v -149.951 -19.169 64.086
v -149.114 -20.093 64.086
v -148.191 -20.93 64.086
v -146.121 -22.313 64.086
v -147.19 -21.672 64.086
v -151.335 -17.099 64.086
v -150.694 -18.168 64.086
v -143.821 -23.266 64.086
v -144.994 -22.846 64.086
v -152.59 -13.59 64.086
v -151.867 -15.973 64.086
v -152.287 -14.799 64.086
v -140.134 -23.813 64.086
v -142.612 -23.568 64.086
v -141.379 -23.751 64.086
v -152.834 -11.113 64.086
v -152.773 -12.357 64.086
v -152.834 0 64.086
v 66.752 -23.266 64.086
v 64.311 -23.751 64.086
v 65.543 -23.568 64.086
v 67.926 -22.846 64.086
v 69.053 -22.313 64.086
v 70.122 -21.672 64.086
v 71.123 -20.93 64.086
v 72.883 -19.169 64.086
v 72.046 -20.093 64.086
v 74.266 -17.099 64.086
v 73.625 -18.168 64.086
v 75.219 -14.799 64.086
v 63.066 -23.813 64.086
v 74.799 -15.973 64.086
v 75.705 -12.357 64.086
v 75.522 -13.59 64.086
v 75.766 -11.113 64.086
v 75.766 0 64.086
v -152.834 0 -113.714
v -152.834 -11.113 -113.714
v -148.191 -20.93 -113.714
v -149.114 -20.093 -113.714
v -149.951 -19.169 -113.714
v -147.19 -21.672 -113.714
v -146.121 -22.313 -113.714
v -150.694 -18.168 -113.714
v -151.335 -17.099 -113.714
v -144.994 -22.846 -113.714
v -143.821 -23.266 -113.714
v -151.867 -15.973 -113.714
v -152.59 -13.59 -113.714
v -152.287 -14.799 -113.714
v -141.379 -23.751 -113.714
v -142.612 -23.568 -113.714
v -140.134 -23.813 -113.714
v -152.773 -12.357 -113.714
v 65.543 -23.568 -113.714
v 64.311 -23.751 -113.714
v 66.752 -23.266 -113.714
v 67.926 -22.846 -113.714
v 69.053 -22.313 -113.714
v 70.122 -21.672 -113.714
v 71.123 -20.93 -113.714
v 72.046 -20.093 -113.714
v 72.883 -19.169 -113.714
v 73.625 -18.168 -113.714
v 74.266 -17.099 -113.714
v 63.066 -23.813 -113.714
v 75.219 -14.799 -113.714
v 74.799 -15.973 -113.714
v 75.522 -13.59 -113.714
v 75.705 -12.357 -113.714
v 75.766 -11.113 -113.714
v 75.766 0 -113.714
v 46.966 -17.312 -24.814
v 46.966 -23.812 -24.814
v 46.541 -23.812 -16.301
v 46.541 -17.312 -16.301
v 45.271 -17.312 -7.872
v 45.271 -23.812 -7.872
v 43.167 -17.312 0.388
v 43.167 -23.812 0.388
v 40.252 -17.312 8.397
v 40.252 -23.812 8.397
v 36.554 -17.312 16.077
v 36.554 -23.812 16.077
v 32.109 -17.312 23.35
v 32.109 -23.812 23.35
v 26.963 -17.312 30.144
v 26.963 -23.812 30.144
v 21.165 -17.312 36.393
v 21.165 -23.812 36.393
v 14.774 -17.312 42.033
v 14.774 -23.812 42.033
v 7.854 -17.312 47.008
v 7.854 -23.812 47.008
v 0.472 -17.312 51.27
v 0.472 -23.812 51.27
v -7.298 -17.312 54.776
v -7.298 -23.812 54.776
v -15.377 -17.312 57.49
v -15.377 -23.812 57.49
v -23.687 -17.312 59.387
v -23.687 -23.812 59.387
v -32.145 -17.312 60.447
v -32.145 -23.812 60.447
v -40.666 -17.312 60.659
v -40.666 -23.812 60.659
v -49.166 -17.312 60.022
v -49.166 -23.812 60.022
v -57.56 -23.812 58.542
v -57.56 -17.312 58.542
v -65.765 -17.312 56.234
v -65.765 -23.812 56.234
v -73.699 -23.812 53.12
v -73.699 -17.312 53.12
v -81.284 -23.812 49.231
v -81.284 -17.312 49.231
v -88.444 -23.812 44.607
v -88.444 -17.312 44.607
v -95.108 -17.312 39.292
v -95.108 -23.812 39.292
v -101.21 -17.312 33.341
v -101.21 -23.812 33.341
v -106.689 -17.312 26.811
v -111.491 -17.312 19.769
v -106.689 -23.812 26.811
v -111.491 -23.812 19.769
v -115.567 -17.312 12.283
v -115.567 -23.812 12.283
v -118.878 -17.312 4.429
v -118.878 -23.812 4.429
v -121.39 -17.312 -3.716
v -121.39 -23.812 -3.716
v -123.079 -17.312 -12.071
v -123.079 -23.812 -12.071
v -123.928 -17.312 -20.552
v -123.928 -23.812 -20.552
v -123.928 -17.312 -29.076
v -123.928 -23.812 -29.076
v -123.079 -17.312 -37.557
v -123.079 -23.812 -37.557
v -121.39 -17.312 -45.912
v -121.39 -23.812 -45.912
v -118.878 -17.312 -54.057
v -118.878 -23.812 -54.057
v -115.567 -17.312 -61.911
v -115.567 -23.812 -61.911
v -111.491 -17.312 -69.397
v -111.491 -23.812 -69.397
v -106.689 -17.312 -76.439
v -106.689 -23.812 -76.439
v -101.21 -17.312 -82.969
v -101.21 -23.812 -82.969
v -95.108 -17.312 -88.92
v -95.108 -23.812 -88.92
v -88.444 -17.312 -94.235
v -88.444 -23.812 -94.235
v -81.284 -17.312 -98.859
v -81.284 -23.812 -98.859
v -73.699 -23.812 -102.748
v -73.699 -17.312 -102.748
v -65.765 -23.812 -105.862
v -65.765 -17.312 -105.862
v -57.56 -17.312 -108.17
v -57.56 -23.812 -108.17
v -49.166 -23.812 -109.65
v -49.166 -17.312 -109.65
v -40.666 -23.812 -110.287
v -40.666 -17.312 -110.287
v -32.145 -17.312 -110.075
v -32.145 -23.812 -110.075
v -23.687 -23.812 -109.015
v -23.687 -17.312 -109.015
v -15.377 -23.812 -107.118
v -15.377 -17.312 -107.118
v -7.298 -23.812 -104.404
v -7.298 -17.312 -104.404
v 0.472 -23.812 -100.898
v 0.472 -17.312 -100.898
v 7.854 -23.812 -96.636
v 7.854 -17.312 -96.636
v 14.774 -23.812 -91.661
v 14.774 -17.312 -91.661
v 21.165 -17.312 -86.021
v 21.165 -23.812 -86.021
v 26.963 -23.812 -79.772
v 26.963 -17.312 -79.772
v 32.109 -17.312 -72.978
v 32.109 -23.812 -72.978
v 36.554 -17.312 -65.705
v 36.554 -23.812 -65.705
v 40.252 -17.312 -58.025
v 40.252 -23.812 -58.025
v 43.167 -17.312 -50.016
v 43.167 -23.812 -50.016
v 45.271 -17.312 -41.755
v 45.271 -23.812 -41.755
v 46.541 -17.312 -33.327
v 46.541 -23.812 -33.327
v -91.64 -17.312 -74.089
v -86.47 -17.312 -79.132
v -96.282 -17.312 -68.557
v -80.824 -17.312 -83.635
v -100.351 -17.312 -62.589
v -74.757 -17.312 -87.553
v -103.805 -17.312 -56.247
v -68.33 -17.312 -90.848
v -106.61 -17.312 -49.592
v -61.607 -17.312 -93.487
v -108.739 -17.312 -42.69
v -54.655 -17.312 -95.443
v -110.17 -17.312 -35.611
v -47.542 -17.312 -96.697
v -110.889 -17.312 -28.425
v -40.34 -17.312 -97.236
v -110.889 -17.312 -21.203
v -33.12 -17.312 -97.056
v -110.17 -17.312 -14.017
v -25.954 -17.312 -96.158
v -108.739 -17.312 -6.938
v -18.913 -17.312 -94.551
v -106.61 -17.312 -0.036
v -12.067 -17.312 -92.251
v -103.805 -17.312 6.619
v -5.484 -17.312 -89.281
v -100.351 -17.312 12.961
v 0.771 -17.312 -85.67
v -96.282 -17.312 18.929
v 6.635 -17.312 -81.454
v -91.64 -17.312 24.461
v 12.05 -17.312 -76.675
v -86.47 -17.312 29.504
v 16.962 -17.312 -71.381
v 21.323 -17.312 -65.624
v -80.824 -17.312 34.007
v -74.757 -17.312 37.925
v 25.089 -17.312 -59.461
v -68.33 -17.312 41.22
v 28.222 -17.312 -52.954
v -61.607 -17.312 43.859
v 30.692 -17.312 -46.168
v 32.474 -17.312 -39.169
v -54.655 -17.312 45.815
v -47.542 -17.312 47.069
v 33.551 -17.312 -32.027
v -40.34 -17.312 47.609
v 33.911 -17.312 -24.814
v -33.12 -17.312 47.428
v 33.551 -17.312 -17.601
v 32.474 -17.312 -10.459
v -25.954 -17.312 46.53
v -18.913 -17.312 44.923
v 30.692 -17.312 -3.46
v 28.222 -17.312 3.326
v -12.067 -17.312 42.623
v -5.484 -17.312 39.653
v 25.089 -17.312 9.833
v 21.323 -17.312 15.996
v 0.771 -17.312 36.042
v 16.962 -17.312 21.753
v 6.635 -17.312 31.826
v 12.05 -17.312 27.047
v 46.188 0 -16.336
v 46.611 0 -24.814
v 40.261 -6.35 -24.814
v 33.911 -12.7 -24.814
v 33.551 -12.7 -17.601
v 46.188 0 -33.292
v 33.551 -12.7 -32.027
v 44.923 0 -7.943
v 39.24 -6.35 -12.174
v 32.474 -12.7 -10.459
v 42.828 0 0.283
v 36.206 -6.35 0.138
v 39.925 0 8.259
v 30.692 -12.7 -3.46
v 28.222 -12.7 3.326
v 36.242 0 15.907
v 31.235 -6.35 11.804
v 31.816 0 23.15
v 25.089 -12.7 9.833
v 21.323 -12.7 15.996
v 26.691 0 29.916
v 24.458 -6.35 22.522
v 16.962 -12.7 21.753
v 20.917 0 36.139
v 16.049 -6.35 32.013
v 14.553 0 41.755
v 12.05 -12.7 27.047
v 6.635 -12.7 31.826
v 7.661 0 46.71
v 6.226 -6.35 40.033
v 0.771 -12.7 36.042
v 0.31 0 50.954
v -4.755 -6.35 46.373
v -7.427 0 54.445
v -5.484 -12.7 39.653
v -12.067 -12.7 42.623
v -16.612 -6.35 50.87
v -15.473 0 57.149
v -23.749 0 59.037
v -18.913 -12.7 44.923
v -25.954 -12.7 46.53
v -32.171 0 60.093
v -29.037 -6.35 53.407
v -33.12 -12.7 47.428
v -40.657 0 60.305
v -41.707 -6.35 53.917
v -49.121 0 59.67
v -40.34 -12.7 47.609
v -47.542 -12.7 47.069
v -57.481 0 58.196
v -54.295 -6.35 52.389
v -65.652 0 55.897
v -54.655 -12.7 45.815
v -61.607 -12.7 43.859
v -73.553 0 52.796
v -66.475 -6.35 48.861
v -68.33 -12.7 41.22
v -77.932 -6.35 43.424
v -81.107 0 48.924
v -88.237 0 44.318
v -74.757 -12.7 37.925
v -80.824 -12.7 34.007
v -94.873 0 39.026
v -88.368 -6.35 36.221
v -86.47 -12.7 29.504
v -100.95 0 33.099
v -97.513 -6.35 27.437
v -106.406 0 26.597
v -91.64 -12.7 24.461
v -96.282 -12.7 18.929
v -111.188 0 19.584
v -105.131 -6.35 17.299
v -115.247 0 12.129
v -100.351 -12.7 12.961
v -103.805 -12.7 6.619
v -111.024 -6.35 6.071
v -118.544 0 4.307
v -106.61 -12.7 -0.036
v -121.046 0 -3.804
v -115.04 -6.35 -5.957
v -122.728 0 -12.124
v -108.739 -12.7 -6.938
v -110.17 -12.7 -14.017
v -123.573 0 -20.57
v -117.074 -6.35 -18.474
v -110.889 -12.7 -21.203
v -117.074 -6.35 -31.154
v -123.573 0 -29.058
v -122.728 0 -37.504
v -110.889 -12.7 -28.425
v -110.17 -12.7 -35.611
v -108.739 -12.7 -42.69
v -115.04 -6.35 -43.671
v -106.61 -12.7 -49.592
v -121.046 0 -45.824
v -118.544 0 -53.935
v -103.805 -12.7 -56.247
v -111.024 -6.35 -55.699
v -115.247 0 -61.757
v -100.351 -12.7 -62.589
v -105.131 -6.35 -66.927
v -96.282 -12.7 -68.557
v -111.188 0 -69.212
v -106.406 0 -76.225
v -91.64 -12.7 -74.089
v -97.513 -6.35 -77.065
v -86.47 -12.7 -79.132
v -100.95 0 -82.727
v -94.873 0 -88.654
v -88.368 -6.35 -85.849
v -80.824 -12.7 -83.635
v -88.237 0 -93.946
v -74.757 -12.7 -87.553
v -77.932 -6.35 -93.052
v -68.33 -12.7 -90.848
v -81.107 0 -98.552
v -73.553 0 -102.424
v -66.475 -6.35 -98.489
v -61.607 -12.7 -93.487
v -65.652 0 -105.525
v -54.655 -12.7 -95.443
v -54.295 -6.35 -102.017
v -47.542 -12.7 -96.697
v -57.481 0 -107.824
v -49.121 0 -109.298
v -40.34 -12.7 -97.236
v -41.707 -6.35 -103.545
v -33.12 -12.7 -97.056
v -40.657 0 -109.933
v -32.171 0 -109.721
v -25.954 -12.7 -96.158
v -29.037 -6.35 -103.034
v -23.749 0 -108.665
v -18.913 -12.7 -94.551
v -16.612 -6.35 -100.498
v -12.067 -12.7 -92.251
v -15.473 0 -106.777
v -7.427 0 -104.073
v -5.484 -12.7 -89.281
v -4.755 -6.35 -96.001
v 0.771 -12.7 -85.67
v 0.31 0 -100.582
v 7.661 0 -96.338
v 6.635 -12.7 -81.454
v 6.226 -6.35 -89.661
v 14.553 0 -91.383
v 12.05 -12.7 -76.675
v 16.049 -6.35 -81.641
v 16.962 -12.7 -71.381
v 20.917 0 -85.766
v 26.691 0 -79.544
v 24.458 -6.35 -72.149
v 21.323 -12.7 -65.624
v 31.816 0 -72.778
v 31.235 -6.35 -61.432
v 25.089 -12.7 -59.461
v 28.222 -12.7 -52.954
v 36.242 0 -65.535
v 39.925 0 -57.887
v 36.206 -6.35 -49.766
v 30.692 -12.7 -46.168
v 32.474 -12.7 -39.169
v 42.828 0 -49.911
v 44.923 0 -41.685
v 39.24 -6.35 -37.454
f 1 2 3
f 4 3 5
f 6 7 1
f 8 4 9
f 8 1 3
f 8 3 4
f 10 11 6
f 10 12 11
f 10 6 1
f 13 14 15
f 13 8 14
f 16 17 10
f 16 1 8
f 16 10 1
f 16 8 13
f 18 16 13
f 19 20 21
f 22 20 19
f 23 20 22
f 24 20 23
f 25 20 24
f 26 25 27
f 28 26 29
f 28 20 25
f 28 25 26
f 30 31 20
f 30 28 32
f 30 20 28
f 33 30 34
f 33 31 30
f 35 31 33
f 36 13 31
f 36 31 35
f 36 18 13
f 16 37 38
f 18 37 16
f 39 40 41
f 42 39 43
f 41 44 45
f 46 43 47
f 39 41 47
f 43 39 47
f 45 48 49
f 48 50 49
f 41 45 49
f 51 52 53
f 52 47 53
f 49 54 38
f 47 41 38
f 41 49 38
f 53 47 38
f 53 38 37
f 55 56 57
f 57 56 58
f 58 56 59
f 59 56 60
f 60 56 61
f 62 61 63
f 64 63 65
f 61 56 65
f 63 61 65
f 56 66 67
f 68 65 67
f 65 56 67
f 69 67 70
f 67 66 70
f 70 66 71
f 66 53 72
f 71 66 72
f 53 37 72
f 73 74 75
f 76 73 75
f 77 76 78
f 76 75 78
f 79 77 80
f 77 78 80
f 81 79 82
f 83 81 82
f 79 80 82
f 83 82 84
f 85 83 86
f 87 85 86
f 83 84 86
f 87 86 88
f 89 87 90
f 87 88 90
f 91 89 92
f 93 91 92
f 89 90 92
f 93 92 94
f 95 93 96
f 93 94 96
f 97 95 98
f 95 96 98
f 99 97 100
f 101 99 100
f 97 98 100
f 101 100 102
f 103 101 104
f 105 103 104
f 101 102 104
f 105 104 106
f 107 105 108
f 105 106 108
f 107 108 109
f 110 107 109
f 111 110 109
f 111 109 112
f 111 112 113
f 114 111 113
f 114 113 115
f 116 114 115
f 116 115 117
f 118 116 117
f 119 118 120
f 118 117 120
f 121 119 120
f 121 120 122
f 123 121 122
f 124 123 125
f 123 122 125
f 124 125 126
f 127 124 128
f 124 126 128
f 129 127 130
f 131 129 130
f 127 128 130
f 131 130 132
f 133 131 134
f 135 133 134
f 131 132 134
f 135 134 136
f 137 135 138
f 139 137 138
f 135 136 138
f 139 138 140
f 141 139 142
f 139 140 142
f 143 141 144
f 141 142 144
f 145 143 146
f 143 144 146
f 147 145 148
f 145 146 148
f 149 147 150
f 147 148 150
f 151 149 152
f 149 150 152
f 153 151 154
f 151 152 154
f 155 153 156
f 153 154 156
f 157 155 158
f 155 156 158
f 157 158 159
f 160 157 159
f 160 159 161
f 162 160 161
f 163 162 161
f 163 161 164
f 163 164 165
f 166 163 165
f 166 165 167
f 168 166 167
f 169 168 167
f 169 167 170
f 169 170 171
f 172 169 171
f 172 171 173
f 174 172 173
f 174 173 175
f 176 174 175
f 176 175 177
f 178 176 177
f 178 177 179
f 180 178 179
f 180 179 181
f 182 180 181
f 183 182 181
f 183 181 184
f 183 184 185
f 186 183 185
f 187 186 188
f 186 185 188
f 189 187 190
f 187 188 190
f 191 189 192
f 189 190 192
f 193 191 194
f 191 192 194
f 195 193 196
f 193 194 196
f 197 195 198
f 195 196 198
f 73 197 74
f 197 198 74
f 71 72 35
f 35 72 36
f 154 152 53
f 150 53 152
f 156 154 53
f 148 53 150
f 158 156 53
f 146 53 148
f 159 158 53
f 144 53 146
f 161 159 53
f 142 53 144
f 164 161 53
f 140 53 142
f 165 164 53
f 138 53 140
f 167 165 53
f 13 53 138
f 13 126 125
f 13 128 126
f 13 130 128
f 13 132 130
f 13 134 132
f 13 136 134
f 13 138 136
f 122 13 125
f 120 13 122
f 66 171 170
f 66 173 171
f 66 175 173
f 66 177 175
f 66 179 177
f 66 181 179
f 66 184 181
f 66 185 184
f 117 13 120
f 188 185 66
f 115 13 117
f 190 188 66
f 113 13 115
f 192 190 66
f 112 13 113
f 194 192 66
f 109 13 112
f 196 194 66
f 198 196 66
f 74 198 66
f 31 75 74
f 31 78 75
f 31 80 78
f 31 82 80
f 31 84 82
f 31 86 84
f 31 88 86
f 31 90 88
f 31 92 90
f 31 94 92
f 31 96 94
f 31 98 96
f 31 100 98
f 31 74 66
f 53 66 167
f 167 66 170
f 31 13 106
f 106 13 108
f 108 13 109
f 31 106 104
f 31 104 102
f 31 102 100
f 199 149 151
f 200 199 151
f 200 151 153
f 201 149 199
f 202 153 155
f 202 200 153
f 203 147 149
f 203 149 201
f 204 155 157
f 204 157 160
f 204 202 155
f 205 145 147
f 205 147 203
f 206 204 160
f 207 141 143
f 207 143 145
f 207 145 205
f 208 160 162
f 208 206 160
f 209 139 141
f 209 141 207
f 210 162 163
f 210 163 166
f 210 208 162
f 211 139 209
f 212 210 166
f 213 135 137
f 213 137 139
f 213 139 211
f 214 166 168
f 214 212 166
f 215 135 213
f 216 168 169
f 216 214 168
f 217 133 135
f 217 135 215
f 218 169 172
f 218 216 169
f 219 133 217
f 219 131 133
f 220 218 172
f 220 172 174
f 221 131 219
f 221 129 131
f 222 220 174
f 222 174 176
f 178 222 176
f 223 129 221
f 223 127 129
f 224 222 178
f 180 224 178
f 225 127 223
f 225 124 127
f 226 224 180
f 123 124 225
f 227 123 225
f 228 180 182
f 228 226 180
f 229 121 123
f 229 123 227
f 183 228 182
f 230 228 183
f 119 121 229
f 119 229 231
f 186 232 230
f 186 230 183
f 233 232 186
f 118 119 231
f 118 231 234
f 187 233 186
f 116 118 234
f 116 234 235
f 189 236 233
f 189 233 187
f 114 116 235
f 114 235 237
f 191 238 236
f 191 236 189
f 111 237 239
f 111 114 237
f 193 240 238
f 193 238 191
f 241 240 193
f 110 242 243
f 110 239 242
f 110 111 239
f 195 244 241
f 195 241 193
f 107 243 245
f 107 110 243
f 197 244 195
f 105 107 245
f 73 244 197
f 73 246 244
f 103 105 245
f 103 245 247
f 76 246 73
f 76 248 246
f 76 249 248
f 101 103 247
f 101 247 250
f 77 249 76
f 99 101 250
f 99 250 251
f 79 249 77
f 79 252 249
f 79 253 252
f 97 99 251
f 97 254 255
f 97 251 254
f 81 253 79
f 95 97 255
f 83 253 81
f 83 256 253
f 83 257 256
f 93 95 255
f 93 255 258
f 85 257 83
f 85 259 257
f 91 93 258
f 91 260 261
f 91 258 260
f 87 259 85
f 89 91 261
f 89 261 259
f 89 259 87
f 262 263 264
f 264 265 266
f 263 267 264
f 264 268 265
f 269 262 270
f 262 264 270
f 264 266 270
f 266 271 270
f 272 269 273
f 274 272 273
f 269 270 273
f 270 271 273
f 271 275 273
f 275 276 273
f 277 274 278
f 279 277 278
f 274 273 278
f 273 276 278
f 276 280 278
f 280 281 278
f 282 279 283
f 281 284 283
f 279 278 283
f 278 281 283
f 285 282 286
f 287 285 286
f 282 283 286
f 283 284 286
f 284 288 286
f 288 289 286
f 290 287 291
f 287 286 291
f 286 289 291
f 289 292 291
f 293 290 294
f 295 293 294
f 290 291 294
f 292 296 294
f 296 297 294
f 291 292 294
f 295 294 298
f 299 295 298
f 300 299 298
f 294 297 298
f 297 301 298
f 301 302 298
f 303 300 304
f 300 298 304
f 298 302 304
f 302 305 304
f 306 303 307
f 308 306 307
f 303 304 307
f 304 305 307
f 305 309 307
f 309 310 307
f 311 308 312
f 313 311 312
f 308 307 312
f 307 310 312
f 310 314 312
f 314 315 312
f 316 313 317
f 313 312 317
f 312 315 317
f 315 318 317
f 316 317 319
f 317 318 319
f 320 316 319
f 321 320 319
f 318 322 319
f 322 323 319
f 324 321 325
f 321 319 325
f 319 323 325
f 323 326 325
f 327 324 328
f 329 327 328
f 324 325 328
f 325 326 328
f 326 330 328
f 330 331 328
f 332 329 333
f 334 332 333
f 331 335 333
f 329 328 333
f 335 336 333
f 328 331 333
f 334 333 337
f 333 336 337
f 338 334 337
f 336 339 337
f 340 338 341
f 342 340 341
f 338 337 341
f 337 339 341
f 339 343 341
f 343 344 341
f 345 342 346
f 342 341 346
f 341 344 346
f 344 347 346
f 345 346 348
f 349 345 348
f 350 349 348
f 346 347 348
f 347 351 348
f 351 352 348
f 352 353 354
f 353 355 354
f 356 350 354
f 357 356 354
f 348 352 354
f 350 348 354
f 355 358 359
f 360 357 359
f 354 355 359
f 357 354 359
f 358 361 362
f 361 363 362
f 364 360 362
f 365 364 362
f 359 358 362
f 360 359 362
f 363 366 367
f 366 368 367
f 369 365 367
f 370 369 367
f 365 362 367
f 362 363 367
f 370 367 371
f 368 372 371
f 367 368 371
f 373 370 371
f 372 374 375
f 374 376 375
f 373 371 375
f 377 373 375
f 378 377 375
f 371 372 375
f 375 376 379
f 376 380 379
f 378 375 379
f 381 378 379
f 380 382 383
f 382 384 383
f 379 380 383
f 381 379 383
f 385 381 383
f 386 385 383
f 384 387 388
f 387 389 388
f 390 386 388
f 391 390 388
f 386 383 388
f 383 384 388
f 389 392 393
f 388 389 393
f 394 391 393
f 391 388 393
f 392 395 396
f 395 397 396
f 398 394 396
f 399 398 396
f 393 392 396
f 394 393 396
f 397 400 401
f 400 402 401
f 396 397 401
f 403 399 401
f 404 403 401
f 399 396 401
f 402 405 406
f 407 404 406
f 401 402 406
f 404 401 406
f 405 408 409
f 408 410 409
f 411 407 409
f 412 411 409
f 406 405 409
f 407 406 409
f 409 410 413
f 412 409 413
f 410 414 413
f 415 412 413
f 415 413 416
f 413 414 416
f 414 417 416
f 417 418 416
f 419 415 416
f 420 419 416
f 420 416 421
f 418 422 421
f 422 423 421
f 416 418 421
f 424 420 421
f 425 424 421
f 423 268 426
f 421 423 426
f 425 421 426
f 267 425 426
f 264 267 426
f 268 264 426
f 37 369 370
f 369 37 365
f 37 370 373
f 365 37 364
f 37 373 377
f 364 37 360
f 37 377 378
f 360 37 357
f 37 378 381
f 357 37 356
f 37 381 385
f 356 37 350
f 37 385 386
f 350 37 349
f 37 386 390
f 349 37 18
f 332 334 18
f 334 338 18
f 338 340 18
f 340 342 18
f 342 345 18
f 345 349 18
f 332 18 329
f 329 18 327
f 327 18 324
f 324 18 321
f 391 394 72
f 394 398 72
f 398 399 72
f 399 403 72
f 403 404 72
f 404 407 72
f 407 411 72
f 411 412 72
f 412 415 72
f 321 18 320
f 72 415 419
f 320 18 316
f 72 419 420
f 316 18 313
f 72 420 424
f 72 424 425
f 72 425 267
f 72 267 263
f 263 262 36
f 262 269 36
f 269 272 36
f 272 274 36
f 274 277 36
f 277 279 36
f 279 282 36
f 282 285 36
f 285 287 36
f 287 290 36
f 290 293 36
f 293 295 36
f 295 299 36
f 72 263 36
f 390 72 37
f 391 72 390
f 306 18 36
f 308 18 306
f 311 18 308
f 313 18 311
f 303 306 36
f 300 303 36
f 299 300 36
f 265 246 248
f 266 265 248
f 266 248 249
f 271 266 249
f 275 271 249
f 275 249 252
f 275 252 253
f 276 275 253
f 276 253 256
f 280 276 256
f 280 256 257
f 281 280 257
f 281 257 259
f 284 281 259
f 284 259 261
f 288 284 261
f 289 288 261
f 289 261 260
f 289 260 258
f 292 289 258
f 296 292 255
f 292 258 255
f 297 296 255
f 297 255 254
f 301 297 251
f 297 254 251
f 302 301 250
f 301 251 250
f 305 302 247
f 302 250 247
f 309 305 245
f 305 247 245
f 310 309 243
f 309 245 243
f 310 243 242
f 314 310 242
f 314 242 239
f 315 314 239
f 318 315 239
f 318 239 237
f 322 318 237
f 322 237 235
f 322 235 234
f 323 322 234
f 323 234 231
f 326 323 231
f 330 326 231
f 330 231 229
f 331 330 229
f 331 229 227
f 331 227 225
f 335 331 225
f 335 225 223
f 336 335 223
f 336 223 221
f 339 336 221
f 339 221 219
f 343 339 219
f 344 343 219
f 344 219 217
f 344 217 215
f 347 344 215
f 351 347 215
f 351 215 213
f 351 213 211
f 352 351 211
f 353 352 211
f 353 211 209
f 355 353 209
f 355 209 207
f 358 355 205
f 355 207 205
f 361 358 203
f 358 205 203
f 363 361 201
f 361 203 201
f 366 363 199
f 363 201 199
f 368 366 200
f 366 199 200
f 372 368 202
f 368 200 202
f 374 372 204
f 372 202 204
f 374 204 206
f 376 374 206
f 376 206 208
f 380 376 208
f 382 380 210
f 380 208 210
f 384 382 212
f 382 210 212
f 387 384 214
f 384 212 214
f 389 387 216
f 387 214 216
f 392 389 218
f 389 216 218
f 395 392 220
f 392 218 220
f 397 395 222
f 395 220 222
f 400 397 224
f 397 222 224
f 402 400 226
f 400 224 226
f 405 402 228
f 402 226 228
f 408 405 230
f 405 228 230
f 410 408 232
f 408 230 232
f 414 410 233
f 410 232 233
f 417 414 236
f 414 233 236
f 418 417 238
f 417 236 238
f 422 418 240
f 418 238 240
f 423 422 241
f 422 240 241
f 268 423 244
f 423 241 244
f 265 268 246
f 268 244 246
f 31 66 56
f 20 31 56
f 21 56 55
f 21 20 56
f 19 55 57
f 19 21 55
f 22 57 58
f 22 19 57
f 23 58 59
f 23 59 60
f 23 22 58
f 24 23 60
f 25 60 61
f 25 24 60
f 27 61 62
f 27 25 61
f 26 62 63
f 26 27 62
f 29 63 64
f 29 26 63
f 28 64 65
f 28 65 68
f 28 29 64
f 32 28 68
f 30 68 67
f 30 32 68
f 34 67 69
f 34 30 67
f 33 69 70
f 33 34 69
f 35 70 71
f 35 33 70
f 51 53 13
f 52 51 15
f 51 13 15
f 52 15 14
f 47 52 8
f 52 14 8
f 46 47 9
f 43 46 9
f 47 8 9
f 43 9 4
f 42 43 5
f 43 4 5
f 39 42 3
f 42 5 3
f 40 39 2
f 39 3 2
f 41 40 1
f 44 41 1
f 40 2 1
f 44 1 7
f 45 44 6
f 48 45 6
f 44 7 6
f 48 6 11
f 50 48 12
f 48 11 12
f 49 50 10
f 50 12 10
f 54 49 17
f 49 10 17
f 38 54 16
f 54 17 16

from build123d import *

# Parameters (mm, degrees)
F0_W     = 228.6
F0_H     = 177.8
F1_DEPTH = 23.8125
F2_R     = 72.445
F3_DEPTH = 25.4
F2_R_2   = 85.5
F4_DEPTH = 6.5
F5_R     = 12.7
F6_R     = 12.7
F7_SIZE  = 12.7


with BuildPart() as f1:
    # F0 (on Front) → F1 (new body)
    with BuildSketch(Plane.XZ):
        with Locations((-38.534197, -24.81398)):
            Rectangle(F0_W, F0_H)
    extrude(amount=F1_DEPTH)

    # F2 (on face) → F3 (cut)
    with BuildSketch(Plane.XZ.offset(23.8125)):
        with Locations((-38.534197, -24.81398)):
            Circle(F2_R)
    extrude(amount=-F3_DEPTH, mode=Mode.SUBTRACT)

    # F2 (on face) → F4 (cut)
    with BuildSketch(Plane.XZ.offset(23.8125)):
        with Locations((-38.534197, -24.81398)):
            Circle(F2_R_2)
        with Locations((-38.534197, -24.81398)):
            Circle(F2_R, mode=Mode.SUBTRACT)
    extrude(amount=-F4_DEPTH, mode=Mode.SUBTRACT)

    # F5
    f5_edges = [f1.edges().sort_by_distance(p)[0] for p in [
        (75.765803, -23.8125, -24.81398),
    ]]
    fillet(f5_edges, radius=F5_R)

    # F6
    f6_edges = [f1.edges().sort_by_distance(p)[0] for p in [
        (-152.834197, -23.8125, -24.81398),
    ]]
    fillet(f6_edges, radius=F6_R)

    # F7
    f7_edges = [f1.edges().sort_by_distance(p)[0] for p in [
        (-110.979197, 0, -24.81398),
    ]]
    chamfer(f7_edges, length=F7_SIZE)


solid = f1.part
